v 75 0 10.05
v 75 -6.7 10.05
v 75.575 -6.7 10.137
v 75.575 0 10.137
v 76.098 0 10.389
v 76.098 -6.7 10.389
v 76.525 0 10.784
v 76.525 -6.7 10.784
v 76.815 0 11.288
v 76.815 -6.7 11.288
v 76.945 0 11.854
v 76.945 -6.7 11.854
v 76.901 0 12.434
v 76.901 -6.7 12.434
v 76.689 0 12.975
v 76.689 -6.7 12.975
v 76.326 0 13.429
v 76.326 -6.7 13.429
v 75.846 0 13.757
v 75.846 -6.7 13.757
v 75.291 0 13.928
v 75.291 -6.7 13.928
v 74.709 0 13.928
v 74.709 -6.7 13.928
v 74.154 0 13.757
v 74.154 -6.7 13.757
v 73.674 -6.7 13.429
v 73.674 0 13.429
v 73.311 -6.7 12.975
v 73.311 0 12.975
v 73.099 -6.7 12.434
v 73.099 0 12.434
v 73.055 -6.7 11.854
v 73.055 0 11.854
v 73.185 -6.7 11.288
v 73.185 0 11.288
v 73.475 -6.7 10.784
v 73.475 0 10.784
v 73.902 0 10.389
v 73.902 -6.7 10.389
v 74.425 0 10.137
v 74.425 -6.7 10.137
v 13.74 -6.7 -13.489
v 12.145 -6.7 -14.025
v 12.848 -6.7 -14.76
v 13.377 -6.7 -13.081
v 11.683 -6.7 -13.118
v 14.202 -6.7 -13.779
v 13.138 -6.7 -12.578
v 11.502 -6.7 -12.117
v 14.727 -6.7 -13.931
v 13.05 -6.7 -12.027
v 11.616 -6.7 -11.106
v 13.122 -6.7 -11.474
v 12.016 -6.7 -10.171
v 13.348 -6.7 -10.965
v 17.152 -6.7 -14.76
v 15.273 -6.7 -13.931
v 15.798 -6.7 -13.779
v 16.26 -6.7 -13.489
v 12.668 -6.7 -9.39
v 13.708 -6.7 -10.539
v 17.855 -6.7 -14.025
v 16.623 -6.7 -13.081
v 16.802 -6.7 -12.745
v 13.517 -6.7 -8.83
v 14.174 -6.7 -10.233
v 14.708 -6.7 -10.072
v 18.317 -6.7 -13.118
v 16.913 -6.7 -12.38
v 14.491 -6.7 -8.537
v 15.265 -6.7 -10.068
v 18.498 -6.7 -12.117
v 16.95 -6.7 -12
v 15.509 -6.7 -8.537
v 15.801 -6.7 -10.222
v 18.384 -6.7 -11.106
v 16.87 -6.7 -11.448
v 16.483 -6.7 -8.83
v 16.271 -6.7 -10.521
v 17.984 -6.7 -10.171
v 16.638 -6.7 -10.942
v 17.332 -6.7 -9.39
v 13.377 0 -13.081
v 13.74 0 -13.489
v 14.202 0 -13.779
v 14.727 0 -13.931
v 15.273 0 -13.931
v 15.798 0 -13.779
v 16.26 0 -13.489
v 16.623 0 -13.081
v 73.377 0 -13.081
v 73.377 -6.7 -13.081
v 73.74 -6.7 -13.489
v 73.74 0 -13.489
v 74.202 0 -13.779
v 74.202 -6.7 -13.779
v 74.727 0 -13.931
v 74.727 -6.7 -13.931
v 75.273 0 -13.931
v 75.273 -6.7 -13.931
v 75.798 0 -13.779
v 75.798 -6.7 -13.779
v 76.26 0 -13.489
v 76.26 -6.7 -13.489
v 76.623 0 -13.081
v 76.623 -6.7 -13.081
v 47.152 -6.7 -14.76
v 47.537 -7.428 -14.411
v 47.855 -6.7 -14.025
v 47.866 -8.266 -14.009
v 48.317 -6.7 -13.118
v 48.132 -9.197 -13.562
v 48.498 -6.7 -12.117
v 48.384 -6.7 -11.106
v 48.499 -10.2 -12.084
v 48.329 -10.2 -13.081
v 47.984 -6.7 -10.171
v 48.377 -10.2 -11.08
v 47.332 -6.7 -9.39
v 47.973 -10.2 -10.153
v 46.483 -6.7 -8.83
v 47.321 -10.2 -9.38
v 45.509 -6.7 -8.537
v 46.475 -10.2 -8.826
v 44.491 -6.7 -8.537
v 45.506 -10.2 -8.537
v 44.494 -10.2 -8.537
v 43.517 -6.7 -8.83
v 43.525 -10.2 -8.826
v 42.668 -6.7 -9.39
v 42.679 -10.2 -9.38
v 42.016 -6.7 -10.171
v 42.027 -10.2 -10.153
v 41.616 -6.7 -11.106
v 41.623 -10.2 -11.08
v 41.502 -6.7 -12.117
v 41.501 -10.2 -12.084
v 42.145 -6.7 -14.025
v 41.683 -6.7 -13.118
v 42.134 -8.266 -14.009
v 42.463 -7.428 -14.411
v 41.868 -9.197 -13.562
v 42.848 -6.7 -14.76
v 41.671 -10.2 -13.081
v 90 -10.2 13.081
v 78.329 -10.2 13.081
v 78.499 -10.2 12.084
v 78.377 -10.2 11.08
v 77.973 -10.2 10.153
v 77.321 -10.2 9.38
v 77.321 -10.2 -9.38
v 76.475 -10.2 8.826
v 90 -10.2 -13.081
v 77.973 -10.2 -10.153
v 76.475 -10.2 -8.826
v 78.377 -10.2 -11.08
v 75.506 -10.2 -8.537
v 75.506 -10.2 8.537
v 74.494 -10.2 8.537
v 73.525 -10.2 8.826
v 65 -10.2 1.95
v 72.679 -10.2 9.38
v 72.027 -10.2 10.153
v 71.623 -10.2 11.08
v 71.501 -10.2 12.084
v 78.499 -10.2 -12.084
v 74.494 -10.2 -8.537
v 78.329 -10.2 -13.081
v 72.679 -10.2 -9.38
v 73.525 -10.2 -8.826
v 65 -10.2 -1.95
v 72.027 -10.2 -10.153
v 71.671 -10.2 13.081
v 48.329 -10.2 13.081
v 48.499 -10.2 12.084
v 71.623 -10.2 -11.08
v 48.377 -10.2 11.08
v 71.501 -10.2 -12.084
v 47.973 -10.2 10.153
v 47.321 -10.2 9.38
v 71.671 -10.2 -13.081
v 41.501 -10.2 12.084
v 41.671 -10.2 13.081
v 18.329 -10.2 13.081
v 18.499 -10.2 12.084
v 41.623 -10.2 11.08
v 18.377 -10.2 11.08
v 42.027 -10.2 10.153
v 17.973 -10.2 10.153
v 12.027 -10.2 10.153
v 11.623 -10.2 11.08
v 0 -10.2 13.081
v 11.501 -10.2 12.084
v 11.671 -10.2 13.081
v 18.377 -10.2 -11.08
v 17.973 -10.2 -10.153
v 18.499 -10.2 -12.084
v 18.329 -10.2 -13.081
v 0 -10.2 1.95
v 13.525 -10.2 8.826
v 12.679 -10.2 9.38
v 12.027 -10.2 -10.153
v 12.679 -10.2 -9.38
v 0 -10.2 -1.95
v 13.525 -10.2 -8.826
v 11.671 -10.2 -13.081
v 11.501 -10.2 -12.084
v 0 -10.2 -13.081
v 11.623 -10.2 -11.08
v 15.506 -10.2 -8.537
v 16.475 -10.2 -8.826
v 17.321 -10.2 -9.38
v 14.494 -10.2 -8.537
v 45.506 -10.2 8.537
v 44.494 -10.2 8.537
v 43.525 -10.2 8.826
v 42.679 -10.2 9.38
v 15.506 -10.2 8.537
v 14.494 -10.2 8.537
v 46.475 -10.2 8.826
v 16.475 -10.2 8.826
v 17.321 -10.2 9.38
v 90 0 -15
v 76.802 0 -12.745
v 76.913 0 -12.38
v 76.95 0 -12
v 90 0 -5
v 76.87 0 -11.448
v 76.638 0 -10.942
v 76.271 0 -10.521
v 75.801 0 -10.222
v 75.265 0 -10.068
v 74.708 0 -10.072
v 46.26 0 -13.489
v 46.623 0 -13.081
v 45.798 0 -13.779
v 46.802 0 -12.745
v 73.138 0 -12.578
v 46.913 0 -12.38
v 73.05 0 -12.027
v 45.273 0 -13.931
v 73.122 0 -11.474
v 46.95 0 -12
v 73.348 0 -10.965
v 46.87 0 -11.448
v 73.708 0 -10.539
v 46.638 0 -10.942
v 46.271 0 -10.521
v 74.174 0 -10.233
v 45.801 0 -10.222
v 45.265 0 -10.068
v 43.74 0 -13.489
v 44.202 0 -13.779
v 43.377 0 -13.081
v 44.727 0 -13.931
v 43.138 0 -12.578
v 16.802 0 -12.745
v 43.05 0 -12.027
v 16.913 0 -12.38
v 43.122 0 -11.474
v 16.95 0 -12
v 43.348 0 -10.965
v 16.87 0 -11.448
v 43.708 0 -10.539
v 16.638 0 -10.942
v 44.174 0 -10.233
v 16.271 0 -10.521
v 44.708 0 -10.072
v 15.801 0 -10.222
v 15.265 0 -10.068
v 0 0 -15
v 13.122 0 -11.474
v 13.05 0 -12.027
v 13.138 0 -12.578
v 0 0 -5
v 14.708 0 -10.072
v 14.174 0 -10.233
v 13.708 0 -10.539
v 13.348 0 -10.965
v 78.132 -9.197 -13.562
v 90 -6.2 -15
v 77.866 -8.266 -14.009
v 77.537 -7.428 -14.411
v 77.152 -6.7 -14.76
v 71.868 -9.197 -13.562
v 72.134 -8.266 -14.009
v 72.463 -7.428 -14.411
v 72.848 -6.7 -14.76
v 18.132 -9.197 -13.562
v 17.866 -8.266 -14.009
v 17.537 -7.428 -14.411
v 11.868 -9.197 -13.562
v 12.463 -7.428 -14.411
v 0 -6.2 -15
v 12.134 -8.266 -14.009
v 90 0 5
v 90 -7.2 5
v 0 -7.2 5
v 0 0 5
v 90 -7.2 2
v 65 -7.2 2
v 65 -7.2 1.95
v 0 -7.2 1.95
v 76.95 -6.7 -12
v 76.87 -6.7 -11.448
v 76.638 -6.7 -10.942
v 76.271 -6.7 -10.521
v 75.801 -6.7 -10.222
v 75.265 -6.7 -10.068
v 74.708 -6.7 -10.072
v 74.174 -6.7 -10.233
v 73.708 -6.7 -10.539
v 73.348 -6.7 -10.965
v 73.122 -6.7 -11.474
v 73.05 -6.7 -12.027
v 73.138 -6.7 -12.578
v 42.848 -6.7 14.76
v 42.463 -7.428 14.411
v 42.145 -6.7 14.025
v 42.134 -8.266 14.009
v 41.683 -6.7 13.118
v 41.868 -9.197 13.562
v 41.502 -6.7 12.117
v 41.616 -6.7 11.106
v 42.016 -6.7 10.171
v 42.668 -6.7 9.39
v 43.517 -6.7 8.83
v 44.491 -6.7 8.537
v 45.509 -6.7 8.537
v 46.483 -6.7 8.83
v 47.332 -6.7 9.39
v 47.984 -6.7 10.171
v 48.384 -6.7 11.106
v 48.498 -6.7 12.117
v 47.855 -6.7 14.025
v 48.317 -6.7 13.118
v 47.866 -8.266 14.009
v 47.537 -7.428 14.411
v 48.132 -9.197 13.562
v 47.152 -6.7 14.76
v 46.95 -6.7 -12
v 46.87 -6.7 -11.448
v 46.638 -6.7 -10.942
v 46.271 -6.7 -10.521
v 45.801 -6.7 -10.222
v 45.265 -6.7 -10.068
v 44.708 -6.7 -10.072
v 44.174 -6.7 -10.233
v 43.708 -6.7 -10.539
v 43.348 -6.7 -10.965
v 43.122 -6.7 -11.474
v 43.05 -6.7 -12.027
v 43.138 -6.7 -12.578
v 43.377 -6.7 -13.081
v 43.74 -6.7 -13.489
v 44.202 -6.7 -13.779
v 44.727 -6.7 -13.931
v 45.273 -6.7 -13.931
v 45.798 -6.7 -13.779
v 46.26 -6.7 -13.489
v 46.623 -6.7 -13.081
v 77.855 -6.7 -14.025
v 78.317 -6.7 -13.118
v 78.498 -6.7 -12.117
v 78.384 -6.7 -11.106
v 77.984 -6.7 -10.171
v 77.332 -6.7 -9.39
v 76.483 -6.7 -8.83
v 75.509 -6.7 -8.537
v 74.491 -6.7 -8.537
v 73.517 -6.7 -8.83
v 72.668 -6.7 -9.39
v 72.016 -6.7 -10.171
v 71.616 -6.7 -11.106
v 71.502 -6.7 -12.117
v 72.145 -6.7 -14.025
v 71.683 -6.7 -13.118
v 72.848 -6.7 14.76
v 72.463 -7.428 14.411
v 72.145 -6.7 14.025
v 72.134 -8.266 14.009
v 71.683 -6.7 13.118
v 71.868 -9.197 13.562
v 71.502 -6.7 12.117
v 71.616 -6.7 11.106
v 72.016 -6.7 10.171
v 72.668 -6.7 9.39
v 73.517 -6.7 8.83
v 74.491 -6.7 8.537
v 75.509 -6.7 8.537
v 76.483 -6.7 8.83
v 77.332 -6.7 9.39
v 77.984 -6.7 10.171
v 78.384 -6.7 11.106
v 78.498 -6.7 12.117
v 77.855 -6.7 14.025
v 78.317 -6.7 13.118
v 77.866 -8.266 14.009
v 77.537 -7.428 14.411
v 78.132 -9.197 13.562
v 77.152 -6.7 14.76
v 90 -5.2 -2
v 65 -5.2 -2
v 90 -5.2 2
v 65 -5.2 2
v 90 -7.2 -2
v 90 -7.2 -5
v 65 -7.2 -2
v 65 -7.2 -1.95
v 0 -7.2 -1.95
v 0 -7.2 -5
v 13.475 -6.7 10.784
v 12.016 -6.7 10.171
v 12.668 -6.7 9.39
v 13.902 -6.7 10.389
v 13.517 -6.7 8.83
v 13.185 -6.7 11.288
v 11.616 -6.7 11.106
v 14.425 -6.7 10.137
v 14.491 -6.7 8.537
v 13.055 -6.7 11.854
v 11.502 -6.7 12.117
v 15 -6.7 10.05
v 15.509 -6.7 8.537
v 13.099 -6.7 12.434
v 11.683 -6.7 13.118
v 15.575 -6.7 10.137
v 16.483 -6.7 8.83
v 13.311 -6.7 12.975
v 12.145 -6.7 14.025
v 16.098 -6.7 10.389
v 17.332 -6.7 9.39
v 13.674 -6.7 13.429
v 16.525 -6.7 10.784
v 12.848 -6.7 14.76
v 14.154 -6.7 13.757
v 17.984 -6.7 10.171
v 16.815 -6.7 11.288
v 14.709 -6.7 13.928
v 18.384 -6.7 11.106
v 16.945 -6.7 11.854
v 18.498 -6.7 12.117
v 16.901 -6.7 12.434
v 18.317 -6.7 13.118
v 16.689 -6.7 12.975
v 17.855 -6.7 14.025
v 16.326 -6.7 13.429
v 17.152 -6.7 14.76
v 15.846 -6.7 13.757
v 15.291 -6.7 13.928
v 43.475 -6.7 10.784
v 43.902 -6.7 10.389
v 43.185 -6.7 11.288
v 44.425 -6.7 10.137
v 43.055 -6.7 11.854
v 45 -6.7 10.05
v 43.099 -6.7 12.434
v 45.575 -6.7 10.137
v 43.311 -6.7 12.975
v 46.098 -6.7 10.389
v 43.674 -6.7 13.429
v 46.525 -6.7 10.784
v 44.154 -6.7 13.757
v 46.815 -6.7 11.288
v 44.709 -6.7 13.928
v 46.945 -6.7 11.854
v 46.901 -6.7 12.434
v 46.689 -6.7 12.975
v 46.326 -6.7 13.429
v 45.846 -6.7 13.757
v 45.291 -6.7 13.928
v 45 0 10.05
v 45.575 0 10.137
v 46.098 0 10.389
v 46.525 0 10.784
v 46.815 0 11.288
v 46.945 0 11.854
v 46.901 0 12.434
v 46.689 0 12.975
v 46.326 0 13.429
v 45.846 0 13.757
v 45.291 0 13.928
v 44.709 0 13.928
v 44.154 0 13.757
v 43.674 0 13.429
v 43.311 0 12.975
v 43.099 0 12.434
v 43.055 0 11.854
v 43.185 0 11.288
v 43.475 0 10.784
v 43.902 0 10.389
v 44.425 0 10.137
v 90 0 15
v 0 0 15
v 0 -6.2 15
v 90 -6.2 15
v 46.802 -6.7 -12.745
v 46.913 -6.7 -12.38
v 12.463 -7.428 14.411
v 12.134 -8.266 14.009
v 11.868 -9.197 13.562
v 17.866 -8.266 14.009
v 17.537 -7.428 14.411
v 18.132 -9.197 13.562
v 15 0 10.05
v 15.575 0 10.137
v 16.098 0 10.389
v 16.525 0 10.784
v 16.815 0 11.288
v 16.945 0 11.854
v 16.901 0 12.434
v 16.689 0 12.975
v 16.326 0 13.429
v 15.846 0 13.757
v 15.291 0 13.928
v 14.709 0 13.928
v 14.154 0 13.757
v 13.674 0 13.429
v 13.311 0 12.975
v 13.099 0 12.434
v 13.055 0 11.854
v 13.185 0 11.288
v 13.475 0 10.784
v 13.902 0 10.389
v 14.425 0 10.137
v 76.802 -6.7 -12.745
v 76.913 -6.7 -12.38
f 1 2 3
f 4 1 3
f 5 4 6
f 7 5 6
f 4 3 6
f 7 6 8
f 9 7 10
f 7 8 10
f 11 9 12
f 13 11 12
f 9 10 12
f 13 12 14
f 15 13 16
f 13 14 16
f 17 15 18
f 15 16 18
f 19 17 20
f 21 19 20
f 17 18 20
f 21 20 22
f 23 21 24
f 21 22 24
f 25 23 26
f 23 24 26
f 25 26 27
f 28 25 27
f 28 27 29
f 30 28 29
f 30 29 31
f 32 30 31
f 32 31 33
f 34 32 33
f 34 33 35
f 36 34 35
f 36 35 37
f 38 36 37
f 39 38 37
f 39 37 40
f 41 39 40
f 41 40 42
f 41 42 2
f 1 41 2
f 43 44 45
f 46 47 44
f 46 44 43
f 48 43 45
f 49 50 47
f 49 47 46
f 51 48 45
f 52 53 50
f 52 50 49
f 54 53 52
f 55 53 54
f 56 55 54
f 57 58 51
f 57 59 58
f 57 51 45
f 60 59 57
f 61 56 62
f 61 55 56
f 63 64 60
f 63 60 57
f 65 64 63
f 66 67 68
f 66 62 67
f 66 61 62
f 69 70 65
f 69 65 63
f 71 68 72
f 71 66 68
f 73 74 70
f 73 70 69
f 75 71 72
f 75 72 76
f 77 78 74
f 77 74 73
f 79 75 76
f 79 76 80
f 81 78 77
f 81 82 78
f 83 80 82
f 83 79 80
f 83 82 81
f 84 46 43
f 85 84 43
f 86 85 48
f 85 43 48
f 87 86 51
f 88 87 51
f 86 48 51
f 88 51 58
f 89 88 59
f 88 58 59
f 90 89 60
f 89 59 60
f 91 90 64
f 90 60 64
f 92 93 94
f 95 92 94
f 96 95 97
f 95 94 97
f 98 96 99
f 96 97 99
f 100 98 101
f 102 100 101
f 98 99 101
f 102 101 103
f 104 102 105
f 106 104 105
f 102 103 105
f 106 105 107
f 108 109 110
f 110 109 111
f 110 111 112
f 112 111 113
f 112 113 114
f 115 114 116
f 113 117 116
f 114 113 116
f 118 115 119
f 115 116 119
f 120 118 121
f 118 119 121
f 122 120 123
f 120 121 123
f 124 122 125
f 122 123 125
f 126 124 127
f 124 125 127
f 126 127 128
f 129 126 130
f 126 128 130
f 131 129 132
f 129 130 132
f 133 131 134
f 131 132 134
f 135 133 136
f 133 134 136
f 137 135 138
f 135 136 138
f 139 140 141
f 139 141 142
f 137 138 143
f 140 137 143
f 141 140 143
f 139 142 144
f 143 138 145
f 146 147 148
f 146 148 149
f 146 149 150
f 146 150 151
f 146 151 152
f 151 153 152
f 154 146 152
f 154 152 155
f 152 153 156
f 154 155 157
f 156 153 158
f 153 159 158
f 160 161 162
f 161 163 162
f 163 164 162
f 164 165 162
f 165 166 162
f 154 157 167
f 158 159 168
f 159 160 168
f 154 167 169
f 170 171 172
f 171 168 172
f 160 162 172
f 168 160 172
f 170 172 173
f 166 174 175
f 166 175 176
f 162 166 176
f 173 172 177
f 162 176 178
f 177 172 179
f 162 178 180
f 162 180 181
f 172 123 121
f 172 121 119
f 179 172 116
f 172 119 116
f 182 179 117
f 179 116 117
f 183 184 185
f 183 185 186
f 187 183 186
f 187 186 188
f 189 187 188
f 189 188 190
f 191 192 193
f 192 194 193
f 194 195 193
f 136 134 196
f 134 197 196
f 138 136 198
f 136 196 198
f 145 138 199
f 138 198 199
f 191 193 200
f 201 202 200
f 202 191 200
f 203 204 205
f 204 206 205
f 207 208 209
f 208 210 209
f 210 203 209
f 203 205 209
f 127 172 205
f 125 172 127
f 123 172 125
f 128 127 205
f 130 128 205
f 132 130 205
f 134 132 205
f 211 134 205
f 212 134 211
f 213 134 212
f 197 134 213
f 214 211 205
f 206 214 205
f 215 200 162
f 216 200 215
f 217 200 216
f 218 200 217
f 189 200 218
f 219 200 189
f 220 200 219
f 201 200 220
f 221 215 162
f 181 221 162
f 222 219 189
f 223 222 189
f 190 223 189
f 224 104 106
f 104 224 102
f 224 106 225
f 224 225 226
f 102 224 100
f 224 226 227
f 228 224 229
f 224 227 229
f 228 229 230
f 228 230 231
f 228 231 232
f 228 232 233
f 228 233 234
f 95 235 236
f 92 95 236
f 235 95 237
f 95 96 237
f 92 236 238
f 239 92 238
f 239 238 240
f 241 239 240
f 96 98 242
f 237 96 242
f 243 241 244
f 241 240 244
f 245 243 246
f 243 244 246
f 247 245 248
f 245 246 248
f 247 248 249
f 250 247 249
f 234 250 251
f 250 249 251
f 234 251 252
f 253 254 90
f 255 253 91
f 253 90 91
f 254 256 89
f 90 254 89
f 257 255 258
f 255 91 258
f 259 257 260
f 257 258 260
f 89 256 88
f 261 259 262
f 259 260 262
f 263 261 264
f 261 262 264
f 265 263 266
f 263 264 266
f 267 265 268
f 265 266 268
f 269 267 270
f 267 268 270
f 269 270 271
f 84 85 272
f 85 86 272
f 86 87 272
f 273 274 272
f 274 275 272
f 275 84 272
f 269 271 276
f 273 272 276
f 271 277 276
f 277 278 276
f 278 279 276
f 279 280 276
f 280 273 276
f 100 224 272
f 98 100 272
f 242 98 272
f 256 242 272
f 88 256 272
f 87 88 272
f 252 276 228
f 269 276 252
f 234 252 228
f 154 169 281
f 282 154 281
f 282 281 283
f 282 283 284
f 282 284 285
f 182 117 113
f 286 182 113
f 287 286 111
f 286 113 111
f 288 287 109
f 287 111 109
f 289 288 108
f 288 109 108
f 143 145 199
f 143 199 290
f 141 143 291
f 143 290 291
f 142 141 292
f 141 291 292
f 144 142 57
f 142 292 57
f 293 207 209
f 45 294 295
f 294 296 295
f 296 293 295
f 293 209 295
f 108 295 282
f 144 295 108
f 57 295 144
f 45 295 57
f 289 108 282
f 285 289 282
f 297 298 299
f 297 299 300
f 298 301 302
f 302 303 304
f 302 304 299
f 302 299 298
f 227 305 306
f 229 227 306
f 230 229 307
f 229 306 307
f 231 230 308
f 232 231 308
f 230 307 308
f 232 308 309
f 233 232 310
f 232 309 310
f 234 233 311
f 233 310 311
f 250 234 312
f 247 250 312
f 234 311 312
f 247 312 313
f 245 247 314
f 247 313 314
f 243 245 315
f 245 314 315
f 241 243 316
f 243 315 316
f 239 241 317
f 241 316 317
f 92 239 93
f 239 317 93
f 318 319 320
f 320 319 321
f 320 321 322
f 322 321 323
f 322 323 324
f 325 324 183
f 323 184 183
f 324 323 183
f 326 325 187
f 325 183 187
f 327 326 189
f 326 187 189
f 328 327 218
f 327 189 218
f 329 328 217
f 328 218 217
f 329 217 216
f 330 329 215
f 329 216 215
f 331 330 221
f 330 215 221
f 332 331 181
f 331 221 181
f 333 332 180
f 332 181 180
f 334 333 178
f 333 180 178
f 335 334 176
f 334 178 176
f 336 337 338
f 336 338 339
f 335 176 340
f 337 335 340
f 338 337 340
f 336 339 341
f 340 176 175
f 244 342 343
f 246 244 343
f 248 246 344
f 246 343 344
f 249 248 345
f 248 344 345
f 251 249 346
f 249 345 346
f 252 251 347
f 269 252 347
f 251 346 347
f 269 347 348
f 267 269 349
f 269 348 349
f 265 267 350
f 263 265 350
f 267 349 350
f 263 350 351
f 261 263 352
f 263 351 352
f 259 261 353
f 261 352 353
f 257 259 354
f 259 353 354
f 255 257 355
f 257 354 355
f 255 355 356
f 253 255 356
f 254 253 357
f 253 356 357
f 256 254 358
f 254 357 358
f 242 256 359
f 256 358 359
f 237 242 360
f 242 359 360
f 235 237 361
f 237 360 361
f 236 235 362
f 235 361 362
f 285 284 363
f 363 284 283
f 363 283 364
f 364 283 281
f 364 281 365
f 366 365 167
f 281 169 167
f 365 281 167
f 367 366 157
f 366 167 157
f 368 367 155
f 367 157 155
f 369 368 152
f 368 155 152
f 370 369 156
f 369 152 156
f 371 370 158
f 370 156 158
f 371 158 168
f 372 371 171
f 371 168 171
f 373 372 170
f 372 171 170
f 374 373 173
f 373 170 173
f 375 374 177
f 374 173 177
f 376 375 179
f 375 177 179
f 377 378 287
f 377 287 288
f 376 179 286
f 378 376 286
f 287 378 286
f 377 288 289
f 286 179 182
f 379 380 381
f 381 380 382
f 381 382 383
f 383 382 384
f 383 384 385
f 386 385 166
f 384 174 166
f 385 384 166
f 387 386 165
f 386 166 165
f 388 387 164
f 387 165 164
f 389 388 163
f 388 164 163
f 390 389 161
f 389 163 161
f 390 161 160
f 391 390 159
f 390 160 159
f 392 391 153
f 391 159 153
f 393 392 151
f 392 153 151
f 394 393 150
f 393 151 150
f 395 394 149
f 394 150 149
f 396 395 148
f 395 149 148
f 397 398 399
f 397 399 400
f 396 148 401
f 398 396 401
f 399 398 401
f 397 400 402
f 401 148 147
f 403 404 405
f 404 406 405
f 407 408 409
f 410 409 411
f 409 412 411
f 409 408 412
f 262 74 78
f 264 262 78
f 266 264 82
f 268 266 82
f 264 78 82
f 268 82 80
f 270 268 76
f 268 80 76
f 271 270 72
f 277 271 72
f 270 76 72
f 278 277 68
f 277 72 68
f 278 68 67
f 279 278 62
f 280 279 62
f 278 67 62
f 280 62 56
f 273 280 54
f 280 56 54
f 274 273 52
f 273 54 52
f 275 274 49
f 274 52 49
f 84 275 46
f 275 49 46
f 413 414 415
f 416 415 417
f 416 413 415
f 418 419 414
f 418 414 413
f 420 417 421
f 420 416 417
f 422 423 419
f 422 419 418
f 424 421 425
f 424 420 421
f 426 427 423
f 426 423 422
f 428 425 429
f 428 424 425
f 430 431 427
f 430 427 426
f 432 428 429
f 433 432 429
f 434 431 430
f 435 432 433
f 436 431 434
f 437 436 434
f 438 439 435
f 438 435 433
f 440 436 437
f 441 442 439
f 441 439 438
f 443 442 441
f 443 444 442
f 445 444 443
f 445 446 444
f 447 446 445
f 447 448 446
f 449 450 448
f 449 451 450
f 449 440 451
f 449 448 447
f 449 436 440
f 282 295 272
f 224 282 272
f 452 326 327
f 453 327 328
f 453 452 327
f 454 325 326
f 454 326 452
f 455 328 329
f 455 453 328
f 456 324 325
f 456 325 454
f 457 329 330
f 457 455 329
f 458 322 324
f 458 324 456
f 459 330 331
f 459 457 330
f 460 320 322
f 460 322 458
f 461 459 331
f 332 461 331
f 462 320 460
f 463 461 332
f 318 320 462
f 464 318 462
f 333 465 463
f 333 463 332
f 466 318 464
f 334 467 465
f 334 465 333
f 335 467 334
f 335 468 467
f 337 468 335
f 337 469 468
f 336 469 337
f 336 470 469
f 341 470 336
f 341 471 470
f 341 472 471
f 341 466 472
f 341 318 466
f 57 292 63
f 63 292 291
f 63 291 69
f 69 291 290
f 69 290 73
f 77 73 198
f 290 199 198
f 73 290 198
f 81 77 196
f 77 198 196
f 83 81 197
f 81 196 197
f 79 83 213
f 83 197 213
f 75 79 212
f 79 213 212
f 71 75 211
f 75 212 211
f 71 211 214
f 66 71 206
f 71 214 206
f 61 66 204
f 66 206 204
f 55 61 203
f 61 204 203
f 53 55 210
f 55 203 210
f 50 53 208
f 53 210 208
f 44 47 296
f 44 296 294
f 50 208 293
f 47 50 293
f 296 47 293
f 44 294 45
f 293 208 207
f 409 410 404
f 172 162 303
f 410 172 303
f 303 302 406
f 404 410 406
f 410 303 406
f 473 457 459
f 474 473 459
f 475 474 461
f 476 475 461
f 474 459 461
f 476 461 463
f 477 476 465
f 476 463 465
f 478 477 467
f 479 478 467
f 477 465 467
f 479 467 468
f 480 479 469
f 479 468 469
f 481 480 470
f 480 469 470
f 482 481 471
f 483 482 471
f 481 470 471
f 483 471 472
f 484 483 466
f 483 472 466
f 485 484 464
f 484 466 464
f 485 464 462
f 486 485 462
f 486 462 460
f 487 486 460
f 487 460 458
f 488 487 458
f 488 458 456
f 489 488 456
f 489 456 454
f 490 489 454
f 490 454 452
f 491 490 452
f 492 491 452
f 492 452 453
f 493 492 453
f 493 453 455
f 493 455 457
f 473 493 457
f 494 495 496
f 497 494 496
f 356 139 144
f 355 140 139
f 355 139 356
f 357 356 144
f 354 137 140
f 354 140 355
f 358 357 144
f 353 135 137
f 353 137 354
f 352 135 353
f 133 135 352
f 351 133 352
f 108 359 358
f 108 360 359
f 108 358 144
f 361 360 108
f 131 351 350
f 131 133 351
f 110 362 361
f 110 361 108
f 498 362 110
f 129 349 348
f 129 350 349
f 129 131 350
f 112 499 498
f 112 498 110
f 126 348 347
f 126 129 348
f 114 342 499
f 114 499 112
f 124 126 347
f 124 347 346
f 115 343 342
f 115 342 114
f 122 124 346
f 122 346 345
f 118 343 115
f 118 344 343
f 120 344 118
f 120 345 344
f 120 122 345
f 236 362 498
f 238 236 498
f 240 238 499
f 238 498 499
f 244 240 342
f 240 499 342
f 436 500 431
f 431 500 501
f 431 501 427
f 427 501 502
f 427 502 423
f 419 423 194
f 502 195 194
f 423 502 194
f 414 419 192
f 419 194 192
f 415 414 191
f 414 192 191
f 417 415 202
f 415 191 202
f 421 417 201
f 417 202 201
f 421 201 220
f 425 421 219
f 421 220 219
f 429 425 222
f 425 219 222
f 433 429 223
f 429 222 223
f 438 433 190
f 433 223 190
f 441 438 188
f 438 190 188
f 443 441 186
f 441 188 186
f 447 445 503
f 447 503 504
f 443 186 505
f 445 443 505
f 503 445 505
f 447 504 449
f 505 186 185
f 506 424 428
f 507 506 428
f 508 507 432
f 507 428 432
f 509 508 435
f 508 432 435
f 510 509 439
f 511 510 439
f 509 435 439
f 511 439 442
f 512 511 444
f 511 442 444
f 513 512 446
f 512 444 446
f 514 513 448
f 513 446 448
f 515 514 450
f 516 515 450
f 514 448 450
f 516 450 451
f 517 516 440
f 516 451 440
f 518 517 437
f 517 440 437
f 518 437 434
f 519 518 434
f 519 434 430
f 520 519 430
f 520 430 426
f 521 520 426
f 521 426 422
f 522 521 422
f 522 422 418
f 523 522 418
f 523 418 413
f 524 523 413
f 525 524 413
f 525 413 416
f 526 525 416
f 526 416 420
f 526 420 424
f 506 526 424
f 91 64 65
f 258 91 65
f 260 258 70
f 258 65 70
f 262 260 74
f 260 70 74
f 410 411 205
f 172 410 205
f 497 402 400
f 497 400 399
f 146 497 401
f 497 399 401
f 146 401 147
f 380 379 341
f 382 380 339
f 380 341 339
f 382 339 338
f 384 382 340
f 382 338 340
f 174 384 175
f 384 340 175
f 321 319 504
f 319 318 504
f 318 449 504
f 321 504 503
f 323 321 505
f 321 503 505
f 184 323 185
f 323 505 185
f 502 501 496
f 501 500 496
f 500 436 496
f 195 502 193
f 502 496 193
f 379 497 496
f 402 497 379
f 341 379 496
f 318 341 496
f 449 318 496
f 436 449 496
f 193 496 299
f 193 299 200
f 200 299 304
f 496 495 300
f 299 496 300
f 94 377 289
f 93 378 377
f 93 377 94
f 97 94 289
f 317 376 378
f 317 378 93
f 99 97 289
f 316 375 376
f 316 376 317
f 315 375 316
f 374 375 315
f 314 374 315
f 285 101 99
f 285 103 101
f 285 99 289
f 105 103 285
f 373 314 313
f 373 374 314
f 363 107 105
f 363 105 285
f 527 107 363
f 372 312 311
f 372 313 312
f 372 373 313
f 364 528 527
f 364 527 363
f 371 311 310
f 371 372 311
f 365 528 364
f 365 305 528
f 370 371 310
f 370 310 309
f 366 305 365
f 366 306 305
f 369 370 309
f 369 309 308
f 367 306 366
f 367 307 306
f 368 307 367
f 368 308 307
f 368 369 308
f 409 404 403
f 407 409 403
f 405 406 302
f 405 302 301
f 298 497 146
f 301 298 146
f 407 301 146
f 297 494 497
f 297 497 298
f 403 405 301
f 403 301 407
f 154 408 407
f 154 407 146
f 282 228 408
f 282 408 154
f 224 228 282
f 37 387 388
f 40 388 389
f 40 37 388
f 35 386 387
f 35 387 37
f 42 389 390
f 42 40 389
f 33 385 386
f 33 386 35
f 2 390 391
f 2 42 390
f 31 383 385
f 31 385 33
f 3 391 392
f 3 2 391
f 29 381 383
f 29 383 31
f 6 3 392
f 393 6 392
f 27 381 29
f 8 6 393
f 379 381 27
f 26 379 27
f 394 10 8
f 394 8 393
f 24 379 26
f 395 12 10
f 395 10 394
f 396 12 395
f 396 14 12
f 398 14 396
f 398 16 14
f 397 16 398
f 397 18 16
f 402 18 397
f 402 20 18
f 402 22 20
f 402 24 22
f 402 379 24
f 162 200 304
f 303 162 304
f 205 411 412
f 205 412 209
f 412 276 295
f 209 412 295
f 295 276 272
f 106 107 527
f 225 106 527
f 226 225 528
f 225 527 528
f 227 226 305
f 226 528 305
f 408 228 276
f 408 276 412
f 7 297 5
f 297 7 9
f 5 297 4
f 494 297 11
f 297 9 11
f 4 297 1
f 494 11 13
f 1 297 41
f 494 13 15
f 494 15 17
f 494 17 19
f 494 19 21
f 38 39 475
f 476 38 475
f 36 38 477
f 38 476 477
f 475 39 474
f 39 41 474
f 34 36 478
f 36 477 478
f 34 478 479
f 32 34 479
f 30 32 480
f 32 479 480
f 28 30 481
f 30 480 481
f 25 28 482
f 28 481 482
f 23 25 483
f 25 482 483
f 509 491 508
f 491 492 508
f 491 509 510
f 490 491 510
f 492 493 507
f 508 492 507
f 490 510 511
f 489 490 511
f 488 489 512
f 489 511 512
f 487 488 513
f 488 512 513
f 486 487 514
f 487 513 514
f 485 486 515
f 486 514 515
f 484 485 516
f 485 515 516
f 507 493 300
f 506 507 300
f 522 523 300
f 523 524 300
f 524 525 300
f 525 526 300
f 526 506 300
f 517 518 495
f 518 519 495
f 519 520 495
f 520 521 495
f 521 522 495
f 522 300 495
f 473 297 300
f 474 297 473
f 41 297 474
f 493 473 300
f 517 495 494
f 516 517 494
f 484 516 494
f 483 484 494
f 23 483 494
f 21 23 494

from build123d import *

# Parameters (mm, degrees)
EXTRUDE_1_DEPTH     = 90
EXTRUDE_1_2_DEPTH   = 90
SKETCH_3_R          = 1.95
CUT_EXTRUDE_1_DEPTH = 92.809803398
SKETCH_5_W          = 25
SKETCH_5_H          = 5
EXTRUDE_2_DEPTH     = 2
SKETCH_6_R          = 3.5
CUT_EXTRUDE_2_DEPTH = 3.5


with BuildPart() as part:
    # 스케치1 → 보스-돌출1 (new body)
    with BuildSketch(Plane(origin=(0, 0, 0), x_dir=(0, 0, -1), z_dir=(1, 0, 0))):
        Polygon((-15, 0), (-15, -6.2), (-13.081136552, -10.2), (-1.95, -10.2), (-1.95, -7.2), (-5, -7.2), (-5, 0), align=None)
    extrude(amount=EXTRUDE_1_DEPTH)


with BuildPart() as body_2:
    # 스케치1 → Extrude 1 2 (new body)
    with BuildSketch(Plane(origin=(0, 0, 0), x_dir=(0, 0, -1), z_dir=(1, 0, 0))):
        Polygon((13.081136552, -10.2), (15, -6.2), (15, 0), (5, 0), (5, -7.2), (1.95, -7.2), (1.95, -10.2), align=None)
    extrude(amount=EXTRUDE_1_2_DEPTH)


with BuildPart() as cut_extrude_1_tool:
    # 스케치3 → 컷-돌출1 (new, through all)
    with BuildSketch(Plane.XZ.offset(10.2)):
        with Locations(Location((15, 12, 0), (0, 0, 270))):
            Circle(SKETCH_3_R)
        with Locations(Location((15, -12, 0), (0, 0, 270))):
            Circle(SKETCH_3_R)
        with Locations(Location((45, -12, 0), (0, 0, 270))):
            Circle(SKETCH_3_R)
        with Locations(Location((75, -12, 0), (0, 0, 270))):
            Circle(SKETCH_3_R)
        with Locations((110, -12)):
            Circle(SKETCH_3_R)
        with Locations((110, 12)):
            Circle(SKETCH_3_R)
        with Locations(Location((75, 12, 0), (0, 0, 270))):
            Circle(SKETCH_3_R)
        with Locations(Location((45, 12, 0), (0, 0, 270))):
            Circle(SKETCH_3_R)
        with BuildLine():
            ThreePointArc((13.377149497, -13.081136552), (15, -13.95), (16.622850503, -13.081136552))
            Line((16.622850503, -13.081136552), (13.377149497, -13.081136552))
        make_face()
        with BuildLine():
            Line((13.377149497, -13.081136552), (16.622850503, -13.081136552))
            ThreePointArc((16.622850503, -13.081136552), (16.866421507, -12.564774963), (16.95, -12))
            ThreePointArc((16.95, -12), (14.435225037, -10.133578493), (13.377149497, -13.081136552))
        make_face()
        with BuildLine():
            ThreePointArc((43.377149497, -13.081136552), (45, -13.95), (46.622850503, -13.081136552))
            Line((46.622850503, -13.081136552), (43.377149497, -13.081136552))
        make_face()
        with BuildLine():
            Line((43.377149497, -13.081136552), (46.622850503, -13.081136552))
            ThreePointArc((46.622850503, -13.081136552), (46.866421507, -12.564774963), (46.95, -12))
            ThreePointArc((46.95, -12), (44.435225037, -10.133578493), (43.377149497, -13.081136552))
        make_face()
        with BuildLine():
            ThreePointArc((76.622850503, -13.081136552), (76.866421507, -12.564774963), (76.95, -12))
            ThreePointArc((76.95, -12), (74.435225037, -10.133578493), (73.377149497, -13.081136552))
            Line((73.377149497, -13.081136552), (76.622850503, -13.081136552))
        make_face()
        with BuildLine():
            Line((76.622850503, -13.081136552), (73.377149497, -13.081136552))
            ThreePointArc((73.377149497, -13.081136552), (75, -13.95), (76.622850503, -13.081136552))
        make_face()
    extrude(amount=-CUT_EXTRUDE_1_DEPTH)


with BuildPart() as part_1:
    add(part.part)

    # 컷-돌출1: cut by cut_extrude_1_tool
    add(cut_extrude_1_tool.part, mode=Mode.SUBTRACT)



with BuildPart() as body_2_1:
    add(body_2.part)

    # 컷-돌출1: cut by cut_extrude_1_tool
    add(cut_extrude_1_tool.part, mode=Mode.SUBTRACT)


with BuildPart() as part_2:
    add(part_1.part)

    add(body_2_1.part)  # 보스-돌출2 merges body 2
    # 스케치5 → 보스-돌출2 (add, symmetric)
    with BuildSketch(Plane.XY):
        with Locations((77.5, -7.7)):
            Rectangle(SKETCH_5_W, SKETCH_5_H)
    extrude(amount=EXTRUDE_2_DEPTH, both=True)

    # 스케치6 → 컷-돌출2 (cut)
    with BuildSketch(Plane.XZ.offset(10.2)):
        with Locations((15, 12)):
            Circle(SKETCH_6_R)
        with Locations((15, -12)):
            Circle(SKETCH_6_R)
        with Locations((45, 12)):
            Circle(SKETCH_6_R)
        with Locations((75, 12)):
            Circle(SKETCH_6_R)
        with Locations((75, -12)):
            Circle(SKETCH_6_R)
        with Locations((45, -12)):
            Circle(SKETCH_6_R)
    extrude(amount=-CUT_EXTRUDE_2_DEPTH, mode=Mode.SUBTRACT)


solid = part_2.part
